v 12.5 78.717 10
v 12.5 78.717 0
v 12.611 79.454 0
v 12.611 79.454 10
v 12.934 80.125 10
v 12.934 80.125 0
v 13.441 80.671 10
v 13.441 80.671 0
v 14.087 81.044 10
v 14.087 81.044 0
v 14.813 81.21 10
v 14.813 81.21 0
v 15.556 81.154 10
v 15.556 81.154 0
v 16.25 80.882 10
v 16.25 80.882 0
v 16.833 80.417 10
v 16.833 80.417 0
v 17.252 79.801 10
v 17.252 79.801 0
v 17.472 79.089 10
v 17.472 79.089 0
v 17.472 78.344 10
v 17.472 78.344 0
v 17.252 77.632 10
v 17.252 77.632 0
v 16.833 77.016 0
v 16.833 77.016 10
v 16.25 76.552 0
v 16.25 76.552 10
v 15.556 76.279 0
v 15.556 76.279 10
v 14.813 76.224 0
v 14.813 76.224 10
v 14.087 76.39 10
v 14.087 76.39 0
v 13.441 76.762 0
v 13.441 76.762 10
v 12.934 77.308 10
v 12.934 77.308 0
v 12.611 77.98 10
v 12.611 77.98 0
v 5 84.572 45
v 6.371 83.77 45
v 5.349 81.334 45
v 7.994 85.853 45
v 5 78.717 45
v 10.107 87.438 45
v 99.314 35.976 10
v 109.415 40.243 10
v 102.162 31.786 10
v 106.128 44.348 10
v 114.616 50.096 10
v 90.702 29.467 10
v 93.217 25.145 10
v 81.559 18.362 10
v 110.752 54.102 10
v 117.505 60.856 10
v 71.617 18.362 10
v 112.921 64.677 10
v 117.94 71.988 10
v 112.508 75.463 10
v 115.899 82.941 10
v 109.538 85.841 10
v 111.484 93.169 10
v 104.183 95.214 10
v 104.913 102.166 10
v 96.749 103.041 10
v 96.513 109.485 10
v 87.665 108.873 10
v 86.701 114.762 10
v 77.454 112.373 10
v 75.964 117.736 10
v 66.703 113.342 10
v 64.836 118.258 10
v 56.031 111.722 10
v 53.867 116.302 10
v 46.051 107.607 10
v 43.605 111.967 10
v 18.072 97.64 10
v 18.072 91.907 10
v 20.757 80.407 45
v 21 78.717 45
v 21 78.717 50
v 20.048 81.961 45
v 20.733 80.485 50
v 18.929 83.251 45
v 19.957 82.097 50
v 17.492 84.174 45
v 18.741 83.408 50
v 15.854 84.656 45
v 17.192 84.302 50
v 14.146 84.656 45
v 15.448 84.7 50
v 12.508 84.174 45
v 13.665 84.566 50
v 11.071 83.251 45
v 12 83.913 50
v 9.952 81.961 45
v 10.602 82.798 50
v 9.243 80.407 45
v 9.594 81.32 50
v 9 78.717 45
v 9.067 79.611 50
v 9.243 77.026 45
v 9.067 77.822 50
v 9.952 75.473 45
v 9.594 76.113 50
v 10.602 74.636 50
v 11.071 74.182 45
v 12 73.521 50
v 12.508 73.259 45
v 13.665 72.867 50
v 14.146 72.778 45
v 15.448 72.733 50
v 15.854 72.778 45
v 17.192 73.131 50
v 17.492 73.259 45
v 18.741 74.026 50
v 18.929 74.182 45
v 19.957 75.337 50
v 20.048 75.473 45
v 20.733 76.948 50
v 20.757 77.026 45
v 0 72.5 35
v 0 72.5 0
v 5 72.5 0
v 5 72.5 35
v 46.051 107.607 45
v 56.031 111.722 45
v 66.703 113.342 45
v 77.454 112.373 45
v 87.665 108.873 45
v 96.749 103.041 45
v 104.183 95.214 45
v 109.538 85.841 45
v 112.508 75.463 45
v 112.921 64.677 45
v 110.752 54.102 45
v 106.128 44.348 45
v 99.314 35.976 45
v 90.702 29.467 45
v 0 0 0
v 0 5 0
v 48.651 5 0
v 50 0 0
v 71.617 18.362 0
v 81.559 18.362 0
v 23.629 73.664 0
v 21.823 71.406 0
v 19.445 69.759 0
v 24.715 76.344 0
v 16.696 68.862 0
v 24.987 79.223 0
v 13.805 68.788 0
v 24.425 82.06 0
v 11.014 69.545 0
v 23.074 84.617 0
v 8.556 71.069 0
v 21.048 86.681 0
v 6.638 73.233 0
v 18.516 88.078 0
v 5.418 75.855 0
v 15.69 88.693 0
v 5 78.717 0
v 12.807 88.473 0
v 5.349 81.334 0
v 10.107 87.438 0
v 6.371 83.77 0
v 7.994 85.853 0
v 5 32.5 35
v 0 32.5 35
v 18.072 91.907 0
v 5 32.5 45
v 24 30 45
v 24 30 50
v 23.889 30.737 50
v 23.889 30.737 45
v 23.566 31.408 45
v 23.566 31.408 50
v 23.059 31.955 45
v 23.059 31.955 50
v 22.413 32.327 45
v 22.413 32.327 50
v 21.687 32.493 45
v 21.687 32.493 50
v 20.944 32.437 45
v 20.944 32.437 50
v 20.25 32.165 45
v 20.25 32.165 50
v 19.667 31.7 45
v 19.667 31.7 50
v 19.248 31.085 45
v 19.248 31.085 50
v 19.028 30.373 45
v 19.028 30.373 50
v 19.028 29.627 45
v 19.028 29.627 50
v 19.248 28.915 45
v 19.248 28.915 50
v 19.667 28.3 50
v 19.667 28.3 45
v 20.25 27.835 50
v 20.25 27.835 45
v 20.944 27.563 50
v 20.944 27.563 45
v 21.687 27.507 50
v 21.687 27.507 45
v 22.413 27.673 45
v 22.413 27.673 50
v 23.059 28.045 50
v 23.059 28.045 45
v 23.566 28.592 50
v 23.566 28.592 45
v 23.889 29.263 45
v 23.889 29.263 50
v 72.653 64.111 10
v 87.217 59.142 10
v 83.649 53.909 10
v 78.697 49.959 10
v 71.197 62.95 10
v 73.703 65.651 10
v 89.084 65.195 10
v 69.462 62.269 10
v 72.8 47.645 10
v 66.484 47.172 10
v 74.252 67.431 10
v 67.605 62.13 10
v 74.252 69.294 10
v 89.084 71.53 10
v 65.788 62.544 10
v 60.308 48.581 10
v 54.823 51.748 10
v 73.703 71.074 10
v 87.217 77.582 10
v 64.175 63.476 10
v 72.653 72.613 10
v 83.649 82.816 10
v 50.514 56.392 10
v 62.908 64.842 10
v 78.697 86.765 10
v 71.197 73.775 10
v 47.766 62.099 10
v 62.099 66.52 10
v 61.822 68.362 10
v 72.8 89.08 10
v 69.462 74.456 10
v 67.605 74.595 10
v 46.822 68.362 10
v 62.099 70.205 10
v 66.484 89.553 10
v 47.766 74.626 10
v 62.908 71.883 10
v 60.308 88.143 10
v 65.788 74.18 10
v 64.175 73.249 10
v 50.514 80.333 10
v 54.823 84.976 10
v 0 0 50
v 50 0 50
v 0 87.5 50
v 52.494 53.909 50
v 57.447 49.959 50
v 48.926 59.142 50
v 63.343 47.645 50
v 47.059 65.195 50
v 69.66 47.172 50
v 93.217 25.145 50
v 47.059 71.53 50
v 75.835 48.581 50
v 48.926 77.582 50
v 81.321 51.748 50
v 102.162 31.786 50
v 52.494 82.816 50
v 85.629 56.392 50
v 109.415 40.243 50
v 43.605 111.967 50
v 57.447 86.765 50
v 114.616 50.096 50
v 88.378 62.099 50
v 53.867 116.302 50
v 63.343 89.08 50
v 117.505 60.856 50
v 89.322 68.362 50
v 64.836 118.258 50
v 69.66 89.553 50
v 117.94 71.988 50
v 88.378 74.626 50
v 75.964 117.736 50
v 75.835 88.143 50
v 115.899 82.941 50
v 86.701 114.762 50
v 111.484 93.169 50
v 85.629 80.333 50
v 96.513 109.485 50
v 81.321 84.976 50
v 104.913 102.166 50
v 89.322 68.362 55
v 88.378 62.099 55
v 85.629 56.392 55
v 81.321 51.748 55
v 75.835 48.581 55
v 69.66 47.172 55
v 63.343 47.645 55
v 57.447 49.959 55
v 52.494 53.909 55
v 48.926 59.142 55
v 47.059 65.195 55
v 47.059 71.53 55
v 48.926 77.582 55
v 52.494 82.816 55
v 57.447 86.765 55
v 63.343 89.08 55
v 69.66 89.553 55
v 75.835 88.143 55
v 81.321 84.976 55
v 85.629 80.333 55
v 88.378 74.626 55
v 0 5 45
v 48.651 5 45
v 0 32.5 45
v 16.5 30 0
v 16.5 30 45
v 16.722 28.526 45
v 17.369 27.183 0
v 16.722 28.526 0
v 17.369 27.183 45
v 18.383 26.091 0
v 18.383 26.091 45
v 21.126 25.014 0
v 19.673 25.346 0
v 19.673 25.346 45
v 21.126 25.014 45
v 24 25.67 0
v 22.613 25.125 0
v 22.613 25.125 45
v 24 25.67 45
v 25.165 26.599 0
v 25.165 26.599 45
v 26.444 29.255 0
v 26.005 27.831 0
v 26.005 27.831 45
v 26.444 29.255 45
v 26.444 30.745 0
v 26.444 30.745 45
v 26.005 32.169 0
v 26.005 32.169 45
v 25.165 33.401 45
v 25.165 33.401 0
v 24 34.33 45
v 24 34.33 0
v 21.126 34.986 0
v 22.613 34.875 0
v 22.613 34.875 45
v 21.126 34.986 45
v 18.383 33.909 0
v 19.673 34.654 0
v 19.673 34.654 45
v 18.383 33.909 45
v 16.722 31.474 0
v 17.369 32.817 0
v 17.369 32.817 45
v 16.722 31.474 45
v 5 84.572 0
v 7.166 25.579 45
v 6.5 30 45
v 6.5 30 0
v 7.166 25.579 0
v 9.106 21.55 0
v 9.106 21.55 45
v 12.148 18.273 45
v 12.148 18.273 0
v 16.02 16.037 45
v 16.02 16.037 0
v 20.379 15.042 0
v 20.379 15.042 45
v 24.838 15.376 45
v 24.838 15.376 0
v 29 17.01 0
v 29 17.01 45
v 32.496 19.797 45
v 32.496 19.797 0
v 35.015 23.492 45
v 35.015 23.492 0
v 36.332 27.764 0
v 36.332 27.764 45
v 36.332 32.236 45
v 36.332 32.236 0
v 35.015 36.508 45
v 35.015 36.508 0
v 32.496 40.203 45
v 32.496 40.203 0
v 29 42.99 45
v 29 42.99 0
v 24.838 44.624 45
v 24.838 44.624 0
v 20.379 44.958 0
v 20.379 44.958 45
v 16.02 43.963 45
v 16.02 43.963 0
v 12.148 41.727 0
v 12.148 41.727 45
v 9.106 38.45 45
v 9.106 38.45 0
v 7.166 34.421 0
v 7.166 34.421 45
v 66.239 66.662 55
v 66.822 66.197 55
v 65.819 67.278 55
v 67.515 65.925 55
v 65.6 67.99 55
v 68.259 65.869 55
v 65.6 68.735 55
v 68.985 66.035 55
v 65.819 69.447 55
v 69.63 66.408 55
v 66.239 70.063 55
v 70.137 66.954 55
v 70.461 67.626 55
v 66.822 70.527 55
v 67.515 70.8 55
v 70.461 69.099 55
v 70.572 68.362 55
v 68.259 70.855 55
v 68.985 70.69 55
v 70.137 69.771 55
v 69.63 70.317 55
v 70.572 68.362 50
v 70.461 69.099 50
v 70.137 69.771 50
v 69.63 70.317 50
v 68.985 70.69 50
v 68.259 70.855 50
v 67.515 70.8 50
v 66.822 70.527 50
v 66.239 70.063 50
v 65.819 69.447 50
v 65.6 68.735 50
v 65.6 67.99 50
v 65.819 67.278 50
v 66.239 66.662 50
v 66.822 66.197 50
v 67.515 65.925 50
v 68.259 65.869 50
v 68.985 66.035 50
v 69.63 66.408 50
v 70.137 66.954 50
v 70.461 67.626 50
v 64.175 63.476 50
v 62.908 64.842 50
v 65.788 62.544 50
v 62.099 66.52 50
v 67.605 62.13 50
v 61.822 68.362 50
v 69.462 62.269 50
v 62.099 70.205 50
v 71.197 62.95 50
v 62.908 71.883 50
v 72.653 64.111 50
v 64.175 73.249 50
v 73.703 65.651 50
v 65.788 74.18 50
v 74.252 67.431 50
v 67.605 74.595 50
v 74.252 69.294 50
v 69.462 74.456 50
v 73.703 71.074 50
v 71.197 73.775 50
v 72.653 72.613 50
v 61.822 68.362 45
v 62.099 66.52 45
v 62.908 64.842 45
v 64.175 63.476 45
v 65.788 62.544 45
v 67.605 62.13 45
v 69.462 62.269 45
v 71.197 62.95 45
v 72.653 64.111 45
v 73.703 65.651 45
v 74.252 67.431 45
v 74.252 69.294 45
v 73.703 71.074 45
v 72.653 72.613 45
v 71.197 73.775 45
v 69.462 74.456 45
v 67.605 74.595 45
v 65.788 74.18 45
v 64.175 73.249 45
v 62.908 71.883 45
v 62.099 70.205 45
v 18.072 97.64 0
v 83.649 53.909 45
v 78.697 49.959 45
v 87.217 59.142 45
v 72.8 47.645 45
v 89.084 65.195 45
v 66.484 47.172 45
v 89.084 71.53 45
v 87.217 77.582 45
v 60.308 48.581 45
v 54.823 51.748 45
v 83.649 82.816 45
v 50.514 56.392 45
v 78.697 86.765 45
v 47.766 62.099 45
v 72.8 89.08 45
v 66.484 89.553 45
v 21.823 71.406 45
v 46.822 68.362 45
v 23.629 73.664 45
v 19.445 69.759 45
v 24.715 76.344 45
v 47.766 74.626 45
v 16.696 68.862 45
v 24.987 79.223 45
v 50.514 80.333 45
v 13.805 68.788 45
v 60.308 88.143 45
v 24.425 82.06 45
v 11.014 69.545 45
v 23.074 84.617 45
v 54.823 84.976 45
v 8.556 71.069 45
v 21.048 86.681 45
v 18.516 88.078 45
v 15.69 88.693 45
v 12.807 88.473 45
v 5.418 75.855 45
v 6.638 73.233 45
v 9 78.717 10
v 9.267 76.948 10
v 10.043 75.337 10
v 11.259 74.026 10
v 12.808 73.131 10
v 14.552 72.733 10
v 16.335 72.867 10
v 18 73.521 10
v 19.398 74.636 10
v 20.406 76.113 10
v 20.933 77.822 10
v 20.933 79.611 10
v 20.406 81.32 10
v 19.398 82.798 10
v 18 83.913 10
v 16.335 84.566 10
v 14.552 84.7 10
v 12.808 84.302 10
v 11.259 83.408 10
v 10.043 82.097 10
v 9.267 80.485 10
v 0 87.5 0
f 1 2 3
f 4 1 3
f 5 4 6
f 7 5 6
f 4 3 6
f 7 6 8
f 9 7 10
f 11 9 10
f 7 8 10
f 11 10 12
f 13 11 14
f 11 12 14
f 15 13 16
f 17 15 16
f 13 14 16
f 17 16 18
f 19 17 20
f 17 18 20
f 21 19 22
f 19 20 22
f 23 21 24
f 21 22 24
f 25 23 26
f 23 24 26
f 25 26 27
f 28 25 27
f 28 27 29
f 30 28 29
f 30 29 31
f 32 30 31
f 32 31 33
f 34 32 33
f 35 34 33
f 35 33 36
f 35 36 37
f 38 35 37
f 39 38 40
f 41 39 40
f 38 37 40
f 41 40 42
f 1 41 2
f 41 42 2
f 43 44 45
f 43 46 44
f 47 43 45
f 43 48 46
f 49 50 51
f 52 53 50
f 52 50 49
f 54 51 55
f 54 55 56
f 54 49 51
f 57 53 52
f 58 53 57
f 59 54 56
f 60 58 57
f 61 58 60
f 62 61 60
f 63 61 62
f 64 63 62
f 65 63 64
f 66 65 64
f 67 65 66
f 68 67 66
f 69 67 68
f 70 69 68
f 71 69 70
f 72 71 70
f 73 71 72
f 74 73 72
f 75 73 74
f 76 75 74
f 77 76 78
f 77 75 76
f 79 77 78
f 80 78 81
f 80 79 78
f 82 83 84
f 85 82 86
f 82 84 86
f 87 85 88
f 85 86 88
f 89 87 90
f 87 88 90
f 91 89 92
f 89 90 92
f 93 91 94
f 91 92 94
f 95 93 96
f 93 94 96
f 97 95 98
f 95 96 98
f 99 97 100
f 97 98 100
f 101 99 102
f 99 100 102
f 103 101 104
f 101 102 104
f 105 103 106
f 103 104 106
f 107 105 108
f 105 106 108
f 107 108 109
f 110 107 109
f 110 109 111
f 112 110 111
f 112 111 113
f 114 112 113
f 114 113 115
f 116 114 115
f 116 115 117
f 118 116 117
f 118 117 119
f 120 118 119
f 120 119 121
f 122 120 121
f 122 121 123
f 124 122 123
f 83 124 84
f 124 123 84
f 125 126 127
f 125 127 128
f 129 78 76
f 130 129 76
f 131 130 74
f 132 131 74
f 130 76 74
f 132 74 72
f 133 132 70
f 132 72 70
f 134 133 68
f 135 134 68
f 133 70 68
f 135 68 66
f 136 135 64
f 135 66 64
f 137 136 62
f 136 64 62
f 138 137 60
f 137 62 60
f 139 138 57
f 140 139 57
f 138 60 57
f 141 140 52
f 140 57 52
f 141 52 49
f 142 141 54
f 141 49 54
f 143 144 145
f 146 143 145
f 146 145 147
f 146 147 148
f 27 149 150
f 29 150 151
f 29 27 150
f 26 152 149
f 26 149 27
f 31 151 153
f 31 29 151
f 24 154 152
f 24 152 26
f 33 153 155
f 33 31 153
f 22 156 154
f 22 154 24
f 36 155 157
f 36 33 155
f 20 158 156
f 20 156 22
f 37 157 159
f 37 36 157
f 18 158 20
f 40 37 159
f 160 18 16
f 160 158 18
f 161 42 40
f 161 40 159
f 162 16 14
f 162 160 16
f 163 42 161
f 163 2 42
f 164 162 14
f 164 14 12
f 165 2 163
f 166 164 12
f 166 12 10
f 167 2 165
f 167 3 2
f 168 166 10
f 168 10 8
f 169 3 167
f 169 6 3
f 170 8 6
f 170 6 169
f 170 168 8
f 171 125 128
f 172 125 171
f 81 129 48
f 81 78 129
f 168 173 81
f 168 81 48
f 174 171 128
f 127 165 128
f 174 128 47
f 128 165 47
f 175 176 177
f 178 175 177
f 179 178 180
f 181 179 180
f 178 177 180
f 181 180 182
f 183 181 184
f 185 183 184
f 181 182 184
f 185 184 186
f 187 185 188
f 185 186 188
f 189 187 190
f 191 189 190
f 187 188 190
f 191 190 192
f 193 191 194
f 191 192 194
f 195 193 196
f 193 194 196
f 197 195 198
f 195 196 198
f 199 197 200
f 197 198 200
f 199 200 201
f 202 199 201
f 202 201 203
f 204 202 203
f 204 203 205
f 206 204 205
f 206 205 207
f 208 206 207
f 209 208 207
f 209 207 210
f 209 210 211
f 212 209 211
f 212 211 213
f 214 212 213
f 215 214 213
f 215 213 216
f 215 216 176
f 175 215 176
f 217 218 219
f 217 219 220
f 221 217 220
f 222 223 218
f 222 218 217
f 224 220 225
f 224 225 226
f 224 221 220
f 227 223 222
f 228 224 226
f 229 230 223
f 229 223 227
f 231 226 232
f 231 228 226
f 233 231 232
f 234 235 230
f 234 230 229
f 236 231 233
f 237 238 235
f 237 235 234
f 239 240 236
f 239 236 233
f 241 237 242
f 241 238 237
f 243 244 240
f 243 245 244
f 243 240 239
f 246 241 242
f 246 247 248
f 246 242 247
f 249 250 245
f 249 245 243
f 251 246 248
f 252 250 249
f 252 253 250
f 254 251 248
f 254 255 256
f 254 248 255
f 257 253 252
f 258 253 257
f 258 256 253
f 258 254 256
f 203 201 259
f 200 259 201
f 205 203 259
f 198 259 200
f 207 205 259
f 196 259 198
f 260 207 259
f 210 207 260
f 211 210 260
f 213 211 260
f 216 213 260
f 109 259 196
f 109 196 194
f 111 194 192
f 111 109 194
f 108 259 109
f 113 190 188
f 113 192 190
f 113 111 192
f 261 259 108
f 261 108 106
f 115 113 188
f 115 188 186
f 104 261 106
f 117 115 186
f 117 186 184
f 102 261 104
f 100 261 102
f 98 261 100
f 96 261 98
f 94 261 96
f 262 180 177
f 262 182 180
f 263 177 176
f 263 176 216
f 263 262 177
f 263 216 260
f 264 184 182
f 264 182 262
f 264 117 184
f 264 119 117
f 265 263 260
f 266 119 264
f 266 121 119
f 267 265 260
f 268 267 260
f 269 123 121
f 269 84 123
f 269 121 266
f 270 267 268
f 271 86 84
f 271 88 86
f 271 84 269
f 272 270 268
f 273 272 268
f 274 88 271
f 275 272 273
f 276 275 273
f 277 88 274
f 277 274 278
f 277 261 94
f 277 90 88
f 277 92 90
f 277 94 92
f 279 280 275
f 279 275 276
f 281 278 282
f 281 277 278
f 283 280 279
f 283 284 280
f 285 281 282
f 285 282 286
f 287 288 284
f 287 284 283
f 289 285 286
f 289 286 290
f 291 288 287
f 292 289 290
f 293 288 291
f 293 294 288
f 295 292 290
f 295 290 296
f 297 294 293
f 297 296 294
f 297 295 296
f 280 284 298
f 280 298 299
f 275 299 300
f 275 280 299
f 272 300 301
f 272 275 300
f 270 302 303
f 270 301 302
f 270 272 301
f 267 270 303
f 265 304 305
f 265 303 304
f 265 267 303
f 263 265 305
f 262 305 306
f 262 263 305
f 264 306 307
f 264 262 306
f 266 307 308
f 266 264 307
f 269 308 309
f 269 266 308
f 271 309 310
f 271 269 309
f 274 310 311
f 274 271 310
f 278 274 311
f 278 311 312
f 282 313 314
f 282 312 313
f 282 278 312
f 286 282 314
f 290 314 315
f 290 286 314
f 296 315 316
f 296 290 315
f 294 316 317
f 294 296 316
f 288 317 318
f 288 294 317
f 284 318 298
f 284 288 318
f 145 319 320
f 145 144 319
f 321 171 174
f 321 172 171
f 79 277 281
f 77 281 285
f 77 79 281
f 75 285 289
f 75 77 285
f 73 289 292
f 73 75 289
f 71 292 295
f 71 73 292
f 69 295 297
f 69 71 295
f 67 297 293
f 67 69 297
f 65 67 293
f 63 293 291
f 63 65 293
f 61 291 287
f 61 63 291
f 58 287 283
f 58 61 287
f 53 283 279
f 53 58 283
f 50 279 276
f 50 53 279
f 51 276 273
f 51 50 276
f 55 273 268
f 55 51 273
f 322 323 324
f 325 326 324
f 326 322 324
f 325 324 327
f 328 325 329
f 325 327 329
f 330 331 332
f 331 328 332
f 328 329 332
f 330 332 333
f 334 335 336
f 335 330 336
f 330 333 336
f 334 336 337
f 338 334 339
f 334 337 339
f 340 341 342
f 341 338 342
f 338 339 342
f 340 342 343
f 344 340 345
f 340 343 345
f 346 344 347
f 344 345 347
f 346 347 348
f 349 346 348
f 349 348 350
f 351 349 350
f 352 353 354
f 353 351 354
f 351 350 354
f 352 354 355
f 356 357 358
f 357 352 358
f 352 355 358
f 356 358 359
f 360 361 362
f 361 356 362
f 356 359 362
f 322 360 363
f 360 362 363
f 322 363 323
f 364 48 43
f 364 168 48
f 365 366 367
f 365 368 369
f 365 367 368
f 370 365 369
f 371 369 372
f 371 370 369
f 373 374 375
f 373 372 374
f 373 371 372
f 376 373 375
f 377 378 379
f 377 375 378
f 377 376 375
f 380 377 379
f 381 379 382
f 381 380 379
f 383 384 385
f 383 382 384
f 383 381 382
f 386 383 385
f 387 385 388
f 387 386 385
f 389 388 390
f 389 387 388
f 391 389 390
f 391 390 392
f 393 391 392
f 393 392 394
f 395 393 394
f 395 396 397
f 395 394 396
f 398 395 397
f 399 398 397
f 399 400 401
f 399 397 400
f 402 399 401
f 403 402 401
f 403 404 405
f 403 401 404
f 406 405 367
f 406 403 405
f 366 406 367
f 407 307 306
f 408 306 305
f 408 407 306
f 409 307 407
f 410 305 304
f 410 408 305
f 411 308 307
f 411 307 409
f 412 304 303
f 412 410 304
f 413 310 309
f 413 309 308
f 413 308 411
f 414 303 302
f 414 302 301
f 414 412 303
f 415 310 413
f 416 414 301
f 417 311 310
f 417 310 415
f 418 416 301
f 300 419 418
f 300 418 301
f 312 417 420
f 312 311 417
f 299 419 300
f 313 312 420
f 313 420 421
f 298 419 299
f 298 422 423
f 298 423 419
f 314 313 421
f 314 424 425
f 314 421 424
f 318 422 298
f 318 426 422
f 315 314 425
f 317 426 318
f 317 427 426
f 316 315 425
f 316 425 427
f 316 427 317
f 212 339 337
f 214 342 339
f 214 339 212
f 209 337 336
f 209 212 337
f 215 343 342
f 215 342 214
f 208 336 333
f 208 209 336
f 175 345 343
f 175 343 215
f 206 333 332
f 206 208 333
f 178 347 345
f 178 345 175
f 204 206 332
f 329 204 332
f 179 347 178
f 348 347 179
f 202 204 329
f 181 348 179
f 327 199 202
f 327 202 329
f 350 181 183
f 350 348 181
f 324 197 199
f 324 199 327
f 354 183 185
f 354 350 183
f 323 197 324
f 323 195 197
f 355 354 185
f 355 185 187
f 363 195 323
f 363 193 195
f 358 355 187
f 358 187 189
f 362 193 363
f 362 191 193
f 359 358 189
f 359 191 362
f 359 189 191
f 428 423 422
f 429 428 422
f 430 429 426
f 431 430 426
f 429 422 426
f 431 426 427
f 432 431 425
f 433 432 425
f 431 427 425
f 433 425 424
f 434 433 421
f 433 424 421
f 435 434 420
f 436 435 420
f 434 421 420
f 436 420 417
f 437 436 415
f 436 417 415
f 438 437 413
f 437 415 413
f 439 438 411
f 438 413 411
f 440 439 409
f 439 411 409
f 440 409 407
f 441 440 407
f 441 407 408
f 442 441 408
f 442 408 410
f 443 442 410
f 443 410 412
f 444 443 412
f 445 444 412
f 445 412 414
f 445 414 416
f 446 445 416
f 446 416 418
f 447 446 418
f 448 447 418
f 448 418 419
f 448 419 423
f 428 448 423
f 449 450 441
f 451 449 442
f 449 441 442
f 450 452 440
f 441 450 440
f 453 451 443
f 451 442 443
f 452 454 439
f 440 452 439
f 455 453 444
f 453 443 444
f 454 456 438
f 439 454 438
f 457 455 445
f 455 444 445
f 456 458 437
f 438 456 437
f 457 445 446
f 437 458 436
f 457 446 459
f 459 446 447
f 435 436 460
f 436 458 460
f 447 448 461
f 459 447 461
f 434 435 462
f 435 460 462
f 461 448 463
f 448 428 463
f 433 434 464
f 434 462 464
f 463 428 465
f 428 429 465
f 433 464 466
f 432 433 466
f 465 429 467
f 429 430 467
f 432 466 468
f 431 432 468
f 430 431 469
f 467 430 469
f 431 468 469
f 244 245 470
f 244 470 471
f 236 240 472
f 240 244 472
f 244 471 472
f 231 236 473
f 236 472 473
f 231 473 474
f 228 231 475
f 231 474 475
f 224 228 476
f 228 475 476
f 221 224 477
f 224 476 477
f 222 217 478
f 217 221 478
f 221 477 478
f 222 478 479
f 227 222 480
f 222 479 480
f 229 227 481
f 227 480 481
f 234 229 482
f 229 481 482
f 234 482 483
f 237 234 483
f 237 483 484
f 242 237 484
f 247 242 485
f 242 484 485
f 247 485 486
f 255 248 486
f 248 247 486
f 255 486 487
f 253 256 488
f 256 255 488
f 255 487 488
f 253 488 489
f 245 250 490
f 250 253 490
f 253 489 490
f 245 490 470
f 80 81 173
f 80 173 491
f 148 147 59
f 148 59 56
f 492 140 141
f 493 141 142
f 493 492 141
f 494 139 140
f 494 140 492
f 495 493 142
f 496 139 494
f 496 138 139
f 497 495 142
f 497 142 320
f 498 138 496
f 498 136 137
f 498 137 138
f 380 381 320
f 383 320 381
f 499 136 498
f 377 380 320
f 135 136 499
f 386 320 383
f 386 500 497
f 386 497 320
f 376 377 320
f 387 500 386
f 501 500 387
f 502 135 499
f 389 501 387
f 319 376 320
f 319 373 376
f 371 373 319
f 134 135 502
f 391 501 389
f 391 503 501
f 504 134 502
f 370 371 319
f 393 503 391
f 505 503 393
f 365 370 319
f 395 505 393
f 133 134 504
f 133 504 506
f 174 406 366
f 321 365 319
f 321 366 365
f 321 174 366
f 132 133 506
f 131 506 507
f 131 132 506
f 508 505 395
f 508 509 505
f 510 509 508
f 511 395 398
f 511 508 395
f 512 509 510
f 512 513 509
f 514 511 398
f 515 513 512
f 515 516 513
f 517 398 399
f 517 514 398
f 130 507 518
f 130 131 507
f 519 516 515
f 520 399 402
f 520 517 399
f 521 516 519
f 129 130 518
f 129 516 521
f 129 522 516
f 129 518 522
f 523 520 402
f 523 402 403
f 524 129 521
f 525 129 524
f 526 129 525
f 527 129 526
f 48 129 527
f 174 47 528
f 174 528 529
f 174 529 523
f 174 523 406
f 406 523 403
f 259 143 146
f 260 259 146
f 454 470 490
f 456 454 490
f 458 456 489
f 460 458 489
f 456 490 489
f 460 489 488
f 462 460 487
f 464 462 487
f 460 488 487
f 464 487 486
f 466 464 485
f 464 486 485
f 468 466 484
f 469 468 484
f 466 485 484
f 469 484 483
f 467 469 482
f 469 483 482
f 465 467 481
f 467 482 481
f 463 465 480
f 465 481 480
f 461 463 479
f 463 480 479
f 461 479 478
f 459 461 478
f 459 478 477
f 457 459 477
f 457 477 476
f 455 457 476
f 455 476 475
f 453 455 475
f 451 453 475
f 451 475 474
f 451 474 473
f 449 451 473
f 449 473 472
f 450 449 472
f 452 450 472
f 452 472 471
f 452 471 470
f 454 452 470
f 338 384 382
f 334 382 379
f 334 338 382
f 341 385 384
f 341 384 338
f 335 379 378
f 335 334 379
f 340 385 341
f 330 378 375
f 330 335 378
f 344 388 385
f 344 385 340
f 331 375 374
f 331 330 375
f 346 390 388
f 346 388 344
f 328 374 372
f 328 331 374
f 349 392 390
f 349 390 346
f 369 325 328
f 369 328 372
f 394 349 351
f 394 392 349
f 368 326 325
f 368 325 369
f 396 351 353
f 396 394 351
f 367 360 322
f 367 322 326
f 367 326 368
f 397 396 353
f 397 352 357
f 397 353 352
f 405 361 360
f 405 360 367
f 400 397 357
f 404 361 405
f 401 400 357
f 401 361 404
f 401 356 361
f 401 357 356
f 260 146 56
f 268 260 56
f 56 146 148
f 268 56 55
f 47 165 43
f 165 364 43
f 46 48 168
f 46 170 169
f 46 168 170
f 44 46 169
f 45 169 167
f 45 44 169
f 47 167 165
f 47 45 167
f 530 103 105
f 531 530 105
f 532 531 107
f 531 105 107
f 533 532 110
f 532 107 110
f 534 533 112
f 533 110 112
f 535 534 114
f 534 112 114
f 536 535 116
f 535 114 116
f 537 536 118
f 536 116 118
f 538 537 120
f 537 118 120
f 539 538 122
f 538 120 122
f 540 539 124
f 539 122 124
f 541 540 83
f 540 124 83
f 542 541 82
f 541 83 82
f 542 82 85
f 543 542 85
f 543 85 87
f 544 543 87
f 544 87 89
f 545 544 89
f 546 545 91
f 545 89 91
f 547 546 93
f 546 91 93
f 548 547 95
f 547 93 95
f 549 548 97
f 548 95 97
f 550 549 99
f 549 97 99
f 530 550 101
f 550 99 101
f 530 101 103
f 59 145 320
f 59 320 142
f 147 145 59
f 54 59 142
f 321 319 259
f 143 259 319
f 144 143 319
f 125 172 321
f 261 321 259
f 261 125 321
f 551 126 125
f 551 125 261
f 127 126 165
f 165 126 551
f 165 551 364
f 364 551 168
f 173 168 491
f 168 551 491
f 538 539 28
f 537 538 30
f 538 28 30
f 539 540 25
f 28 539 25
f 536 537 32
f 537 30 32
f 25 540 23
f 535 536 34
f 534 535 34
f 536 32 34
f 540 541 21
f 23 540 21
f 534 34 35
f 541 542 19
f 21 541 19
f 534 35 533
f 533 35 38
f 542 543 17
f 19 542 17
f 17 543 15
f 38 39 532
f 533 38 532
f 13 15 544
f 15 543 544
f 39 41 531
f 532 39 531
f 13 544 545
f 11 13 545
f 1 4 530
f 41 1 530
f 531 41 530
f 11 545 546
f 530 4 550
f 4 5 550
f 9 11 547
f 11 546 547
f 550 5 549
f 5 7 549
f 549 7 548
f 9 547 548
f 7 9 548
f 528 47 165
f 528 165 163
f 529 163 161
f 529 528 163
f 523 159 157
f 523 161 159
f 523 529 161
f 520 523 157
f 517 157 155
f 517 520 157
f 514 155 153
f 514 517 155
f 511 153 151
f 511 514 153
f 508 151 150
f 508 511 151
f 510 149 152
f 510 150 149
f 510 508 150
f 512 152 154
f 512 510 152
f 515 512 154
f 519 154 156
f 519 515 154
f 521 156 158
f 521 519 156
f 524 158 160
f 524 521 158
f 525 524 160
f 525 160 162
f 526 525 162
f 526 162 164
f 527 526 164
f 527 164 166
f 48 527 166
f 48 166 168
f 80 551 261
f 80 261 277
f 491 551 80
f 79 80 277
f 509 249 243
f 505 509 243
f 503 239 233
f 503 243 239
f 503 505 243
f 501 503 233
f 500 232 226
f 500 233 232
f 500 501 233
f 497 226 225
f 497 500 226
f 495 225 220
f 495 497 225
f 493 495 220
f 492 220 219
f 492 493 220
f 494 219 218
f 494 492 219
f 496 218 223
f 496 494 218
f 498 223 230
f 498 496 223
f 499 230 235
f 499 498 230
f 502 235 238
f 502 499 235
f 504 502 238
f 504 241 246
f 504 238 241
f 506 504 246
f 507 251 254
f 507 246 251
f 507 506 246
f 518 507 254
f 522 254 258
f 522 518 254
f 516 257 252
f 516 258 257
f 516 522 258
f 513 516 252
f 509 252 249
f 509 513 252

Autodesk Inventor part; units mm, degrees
ref_plane "YZ Plane" through (0, 0, 0) normal (1, 0, 0) x (0, 1, 0)
ref_plane "XZ Plane" through (0, 0, 0) normal (0, 1, 0) x (-1, 0, 0)
ref_plane "XY Plane" through (0, 0, 0) normal (0, 0, 1) x (1, 0, 0)
sketch "Sketch1" plane through (0, 0, 0) normal (0, 0, 1) x (1, 0, 0)
  line L0 (0, 0) -> (0, 87.5)
  circle A0 centre (68.0717, 68.3624) radius 50 construction
  line L1 (0, 87.5) -> (43.6046, 111.967)
  line L2 (0, 0) -> (50, 0)
  line L3 (50, 0) -> (93.217, 25.1454)
  arc A1 (93.217, 25.1454) -> (43.6046, 111.967) centre (68.0717, 68.3624) ccw
  dimension "d0" = 87.5
  dimension "d1" = 100
  dimension "d2" = 50
  dimension "d3" = 50
  dimension "d4" = 50
extrude "Extrusion1" add sketch "Sketch1" along normal blind 50
sketch "Sketch3" plane through (0, 0, 0) normal (0, 0, -1) x (-1, 0, 0)
  line L0 (0, 87.5) -> (-43.6046, 111.967) projected
  arc A0 (-43.6046, 111.967) -> (-93.217, 25.1454) centre (-68.0717, 68.3624) ccw projected
  line L1 (-93.217, 25.1454) -> (-50, 0) projected
  line L2 (-50, 0) -> (0, 0) projected
  line L3 (0, 5) -> (-48.6512, 5)
  line L4 (-48.6512, 5) -> (-90.7025, 29.4671)
  arc A1 (-46.0513, 107.6066) -> (-90.7025, 29.4671) centre (-68.0717, 68.3624) ccw
  line L5 (-46.0513, 107.6066) -> (0, 81.7667)
  line L6 (0, 0) -> (0, 87.5) projected
  line L7 (0, 5) -> (0, 81.7667)
  line L8 (0, 87.5) -> (0, 0) projected
  dimension "d10" = 5
extrude "Extrusion3" cut sketch "Sketch3" against normal blind 45 contours L6 L3 L4 A1 L5
sketch "Sketch4" plane through (0, 0, 45) normal (0, 0, -1) x (-1, 0, 0)
  arc A0 (-43.6046, 111.967) -> (-93.217, 25.1454) centre (-68.0717, 68.3624) ccw projected
  circle A1 centre (-68.0717, 68.3624) radius 6.25
  point P0 (0, 0)
  dimension "d13" = 12.5
extrude "Extrusion4" cut sketch "Sketch4" against normal through all
sketch "Sketch5" plane through (0, 0, 45) normal (0, 0, -1) x (-1, 0, 0)
  circle A0 centre (-68.0717, 68.3624) radius 6.25 projected
  circle A1 centre (-68.0717, 68.3624) radius 6.25
  circle A2 centre (-68.0717, 68.3624) radius 21.25
  point P0 (0, 0)
  dimension "d16" = 15
extrude "Extrusion5" add sketch "Sketch5" along normal blind 35
sketch "Sketch6" plane through (0, 0, 50) normal (0, 0, 1) x (1, 0, 0)
  circle A0 centre (68.0717, 68.3624) radius 21.25 projected
  point P0 (0, 0)
extrude "Extrusion6" add sketch "Sketch6" along normal blind 5
sketch "Sketch7" plane through (0, 0, 0) normal (0, 0, -1) x (-1, 0, 0)
  arc A0 (-43.6046, 111.967) -> (-93.217, 25.1454) centre (-68.0717, 68.3624) ccw projected
  line L0 (-18.0717, 68.3624) -> (-18.0717, 97.6402)
  line L1 (0, 87.5) -> (-43.6046, 111.967) projected
  line L2 (-18.0717, 97.6402) -> (-43.6046, 111.967)
  line L3 (-68.0717, 18.3624) -> (-81.5592, 18.3624)
  line L4 (-93.217, 25.1454) -> (-50, 0) projected
  line L5 (-50, 0) -> (-93.217, 25.1454) projected
  line L6 (-81.5592, 18.3624) -> (-93.217, 25.1454)
  arc A1 (-93.217, 25.1454) -> (-68.0717, 18.3624) centre (-68.0717, 68.3624) ccw
  arc A2 (-43.6046, 111.967) -> (-93.217, 25.1454) centre (-68.0717, 68.3624) ccw projected
  arc A3 (-18.0717, 68.3624) -> (-43.6046, 111.967) centre (-68.0717, 68.3624) ccw
  circle A4 centre (-68.0717, 68.3624) radius 50
  point P0 (0, 0)
extrude "Extrusion7" cut sketch "Sketch7" against normal blind 10
sketch "Sketch8" plane through (0, 0, 45) normal (0, 0, -1) x (-1, 0, 0)
  circle A0 centre (-21.5, 30) radius 5
  circle A1 centre (-21.5, 30) radius 15
  line L0 (-50, 0) -> (0, 0) projected
  line L1 (0, 0) -> (0, 5) projected
  dimension "d23" = 10
  dimension "d24" = 30
  dimension "d25" = 30
  dimension "d26" = 21.5
extrude "Extrusion8" add sketch "Sketch8" along normal blind 45
sketch "Sketch9" plane through (0, 0, 50) normal (-1, 0, 0) x (0, 0, 1)
  line L0 (0, 87.5) -> (-50, 87.5)
  line L1 (-50, 87.5) -> (-50, 72.5)
  line L2 (-50, 72.5) -> (0, 72.5)
  line L3 (0, 72.5) -> (0, 87.5)
  line L4 (0, 87.5) -> (-15, 87.5)
  line L5 (-15, 87.5) -> (-15, 32.5)
  line L6 (-15, 32.5) -> (0, 32.5)
  line L7 (0, 32.5) -> (0, 87.5)
  line L8 (-50, 0) -> (0, 0) projected
  dimension "d29" = 50
  dimension "d30" = 15
  dimension "d31" = 15
  dimension "d32" = 32.5
extrude "Extrusion9" add sketch "Sketch9" against normal blind 5
sketch "Sketch10" plane through (0, 0, 45) normal (0, 0, -1) x (-1, 0, 0)
  circle A0 centre (-15, 78.7167) radius 10
  circle A1 centre (-15, 78.7167) radius 6
  line L0 (-18.0717, 91.9069) -> (-5, 84.5722) projected
  line L1 (-5, 72.5) -> (-5, 84.5722) projected
  point P0 (0, 0)
  dimension "d35" = 20
  dimension "d36" = 12
extrude "Extrusion10" add sketch "Sketch10" along normal blind 45 contours A0
sketch "Sketch11" plane through (0, 0, 0) normal (0, 0, -1) x (-1, 0, 0)
  circle A0 centre (-15, 78.7167) radius 6 projected
  circle A1 centre (-15, 78.7167) radius 2.5
  point P0 (0, 0)
  dimension "d39" = 5
extrude "Extrusion11" add sketch "Sketch11" against normal blind 10
sketch "Sketch13" plane through (0, 0, 50) normal (0, 0, 1) x (1, 0, 0)
  circle A0 centre (15, 78.7167) radius 6 projected
  point P0 (0, 0)
extrude "Extrusion12" cut sketch "Sketch13" against normal blind 5
sketch "Sketch14" plane through (68.0717, 68.3624, 55) normal (0, 0, 1) x (1, 0, 0)
  circle A0 centre (0, 0) radius 2.5
  circle A1 centre (0, 0) radius 21.25 projected
  circle A2 centre (-46.5717, -38.3624) radius 15 projected
  circle A3 centre (-46.5717, -38.3624) radius 2.5
  point P0 (-68.0717, -68.3624)
  dimension "d44" = 5
  dimension "d47" = 5
extrude "Extrusion13" cut sketch "Sketch14" against normal through all contours A0 | A3
properties part number "BA004" material "ABS Plastic"
